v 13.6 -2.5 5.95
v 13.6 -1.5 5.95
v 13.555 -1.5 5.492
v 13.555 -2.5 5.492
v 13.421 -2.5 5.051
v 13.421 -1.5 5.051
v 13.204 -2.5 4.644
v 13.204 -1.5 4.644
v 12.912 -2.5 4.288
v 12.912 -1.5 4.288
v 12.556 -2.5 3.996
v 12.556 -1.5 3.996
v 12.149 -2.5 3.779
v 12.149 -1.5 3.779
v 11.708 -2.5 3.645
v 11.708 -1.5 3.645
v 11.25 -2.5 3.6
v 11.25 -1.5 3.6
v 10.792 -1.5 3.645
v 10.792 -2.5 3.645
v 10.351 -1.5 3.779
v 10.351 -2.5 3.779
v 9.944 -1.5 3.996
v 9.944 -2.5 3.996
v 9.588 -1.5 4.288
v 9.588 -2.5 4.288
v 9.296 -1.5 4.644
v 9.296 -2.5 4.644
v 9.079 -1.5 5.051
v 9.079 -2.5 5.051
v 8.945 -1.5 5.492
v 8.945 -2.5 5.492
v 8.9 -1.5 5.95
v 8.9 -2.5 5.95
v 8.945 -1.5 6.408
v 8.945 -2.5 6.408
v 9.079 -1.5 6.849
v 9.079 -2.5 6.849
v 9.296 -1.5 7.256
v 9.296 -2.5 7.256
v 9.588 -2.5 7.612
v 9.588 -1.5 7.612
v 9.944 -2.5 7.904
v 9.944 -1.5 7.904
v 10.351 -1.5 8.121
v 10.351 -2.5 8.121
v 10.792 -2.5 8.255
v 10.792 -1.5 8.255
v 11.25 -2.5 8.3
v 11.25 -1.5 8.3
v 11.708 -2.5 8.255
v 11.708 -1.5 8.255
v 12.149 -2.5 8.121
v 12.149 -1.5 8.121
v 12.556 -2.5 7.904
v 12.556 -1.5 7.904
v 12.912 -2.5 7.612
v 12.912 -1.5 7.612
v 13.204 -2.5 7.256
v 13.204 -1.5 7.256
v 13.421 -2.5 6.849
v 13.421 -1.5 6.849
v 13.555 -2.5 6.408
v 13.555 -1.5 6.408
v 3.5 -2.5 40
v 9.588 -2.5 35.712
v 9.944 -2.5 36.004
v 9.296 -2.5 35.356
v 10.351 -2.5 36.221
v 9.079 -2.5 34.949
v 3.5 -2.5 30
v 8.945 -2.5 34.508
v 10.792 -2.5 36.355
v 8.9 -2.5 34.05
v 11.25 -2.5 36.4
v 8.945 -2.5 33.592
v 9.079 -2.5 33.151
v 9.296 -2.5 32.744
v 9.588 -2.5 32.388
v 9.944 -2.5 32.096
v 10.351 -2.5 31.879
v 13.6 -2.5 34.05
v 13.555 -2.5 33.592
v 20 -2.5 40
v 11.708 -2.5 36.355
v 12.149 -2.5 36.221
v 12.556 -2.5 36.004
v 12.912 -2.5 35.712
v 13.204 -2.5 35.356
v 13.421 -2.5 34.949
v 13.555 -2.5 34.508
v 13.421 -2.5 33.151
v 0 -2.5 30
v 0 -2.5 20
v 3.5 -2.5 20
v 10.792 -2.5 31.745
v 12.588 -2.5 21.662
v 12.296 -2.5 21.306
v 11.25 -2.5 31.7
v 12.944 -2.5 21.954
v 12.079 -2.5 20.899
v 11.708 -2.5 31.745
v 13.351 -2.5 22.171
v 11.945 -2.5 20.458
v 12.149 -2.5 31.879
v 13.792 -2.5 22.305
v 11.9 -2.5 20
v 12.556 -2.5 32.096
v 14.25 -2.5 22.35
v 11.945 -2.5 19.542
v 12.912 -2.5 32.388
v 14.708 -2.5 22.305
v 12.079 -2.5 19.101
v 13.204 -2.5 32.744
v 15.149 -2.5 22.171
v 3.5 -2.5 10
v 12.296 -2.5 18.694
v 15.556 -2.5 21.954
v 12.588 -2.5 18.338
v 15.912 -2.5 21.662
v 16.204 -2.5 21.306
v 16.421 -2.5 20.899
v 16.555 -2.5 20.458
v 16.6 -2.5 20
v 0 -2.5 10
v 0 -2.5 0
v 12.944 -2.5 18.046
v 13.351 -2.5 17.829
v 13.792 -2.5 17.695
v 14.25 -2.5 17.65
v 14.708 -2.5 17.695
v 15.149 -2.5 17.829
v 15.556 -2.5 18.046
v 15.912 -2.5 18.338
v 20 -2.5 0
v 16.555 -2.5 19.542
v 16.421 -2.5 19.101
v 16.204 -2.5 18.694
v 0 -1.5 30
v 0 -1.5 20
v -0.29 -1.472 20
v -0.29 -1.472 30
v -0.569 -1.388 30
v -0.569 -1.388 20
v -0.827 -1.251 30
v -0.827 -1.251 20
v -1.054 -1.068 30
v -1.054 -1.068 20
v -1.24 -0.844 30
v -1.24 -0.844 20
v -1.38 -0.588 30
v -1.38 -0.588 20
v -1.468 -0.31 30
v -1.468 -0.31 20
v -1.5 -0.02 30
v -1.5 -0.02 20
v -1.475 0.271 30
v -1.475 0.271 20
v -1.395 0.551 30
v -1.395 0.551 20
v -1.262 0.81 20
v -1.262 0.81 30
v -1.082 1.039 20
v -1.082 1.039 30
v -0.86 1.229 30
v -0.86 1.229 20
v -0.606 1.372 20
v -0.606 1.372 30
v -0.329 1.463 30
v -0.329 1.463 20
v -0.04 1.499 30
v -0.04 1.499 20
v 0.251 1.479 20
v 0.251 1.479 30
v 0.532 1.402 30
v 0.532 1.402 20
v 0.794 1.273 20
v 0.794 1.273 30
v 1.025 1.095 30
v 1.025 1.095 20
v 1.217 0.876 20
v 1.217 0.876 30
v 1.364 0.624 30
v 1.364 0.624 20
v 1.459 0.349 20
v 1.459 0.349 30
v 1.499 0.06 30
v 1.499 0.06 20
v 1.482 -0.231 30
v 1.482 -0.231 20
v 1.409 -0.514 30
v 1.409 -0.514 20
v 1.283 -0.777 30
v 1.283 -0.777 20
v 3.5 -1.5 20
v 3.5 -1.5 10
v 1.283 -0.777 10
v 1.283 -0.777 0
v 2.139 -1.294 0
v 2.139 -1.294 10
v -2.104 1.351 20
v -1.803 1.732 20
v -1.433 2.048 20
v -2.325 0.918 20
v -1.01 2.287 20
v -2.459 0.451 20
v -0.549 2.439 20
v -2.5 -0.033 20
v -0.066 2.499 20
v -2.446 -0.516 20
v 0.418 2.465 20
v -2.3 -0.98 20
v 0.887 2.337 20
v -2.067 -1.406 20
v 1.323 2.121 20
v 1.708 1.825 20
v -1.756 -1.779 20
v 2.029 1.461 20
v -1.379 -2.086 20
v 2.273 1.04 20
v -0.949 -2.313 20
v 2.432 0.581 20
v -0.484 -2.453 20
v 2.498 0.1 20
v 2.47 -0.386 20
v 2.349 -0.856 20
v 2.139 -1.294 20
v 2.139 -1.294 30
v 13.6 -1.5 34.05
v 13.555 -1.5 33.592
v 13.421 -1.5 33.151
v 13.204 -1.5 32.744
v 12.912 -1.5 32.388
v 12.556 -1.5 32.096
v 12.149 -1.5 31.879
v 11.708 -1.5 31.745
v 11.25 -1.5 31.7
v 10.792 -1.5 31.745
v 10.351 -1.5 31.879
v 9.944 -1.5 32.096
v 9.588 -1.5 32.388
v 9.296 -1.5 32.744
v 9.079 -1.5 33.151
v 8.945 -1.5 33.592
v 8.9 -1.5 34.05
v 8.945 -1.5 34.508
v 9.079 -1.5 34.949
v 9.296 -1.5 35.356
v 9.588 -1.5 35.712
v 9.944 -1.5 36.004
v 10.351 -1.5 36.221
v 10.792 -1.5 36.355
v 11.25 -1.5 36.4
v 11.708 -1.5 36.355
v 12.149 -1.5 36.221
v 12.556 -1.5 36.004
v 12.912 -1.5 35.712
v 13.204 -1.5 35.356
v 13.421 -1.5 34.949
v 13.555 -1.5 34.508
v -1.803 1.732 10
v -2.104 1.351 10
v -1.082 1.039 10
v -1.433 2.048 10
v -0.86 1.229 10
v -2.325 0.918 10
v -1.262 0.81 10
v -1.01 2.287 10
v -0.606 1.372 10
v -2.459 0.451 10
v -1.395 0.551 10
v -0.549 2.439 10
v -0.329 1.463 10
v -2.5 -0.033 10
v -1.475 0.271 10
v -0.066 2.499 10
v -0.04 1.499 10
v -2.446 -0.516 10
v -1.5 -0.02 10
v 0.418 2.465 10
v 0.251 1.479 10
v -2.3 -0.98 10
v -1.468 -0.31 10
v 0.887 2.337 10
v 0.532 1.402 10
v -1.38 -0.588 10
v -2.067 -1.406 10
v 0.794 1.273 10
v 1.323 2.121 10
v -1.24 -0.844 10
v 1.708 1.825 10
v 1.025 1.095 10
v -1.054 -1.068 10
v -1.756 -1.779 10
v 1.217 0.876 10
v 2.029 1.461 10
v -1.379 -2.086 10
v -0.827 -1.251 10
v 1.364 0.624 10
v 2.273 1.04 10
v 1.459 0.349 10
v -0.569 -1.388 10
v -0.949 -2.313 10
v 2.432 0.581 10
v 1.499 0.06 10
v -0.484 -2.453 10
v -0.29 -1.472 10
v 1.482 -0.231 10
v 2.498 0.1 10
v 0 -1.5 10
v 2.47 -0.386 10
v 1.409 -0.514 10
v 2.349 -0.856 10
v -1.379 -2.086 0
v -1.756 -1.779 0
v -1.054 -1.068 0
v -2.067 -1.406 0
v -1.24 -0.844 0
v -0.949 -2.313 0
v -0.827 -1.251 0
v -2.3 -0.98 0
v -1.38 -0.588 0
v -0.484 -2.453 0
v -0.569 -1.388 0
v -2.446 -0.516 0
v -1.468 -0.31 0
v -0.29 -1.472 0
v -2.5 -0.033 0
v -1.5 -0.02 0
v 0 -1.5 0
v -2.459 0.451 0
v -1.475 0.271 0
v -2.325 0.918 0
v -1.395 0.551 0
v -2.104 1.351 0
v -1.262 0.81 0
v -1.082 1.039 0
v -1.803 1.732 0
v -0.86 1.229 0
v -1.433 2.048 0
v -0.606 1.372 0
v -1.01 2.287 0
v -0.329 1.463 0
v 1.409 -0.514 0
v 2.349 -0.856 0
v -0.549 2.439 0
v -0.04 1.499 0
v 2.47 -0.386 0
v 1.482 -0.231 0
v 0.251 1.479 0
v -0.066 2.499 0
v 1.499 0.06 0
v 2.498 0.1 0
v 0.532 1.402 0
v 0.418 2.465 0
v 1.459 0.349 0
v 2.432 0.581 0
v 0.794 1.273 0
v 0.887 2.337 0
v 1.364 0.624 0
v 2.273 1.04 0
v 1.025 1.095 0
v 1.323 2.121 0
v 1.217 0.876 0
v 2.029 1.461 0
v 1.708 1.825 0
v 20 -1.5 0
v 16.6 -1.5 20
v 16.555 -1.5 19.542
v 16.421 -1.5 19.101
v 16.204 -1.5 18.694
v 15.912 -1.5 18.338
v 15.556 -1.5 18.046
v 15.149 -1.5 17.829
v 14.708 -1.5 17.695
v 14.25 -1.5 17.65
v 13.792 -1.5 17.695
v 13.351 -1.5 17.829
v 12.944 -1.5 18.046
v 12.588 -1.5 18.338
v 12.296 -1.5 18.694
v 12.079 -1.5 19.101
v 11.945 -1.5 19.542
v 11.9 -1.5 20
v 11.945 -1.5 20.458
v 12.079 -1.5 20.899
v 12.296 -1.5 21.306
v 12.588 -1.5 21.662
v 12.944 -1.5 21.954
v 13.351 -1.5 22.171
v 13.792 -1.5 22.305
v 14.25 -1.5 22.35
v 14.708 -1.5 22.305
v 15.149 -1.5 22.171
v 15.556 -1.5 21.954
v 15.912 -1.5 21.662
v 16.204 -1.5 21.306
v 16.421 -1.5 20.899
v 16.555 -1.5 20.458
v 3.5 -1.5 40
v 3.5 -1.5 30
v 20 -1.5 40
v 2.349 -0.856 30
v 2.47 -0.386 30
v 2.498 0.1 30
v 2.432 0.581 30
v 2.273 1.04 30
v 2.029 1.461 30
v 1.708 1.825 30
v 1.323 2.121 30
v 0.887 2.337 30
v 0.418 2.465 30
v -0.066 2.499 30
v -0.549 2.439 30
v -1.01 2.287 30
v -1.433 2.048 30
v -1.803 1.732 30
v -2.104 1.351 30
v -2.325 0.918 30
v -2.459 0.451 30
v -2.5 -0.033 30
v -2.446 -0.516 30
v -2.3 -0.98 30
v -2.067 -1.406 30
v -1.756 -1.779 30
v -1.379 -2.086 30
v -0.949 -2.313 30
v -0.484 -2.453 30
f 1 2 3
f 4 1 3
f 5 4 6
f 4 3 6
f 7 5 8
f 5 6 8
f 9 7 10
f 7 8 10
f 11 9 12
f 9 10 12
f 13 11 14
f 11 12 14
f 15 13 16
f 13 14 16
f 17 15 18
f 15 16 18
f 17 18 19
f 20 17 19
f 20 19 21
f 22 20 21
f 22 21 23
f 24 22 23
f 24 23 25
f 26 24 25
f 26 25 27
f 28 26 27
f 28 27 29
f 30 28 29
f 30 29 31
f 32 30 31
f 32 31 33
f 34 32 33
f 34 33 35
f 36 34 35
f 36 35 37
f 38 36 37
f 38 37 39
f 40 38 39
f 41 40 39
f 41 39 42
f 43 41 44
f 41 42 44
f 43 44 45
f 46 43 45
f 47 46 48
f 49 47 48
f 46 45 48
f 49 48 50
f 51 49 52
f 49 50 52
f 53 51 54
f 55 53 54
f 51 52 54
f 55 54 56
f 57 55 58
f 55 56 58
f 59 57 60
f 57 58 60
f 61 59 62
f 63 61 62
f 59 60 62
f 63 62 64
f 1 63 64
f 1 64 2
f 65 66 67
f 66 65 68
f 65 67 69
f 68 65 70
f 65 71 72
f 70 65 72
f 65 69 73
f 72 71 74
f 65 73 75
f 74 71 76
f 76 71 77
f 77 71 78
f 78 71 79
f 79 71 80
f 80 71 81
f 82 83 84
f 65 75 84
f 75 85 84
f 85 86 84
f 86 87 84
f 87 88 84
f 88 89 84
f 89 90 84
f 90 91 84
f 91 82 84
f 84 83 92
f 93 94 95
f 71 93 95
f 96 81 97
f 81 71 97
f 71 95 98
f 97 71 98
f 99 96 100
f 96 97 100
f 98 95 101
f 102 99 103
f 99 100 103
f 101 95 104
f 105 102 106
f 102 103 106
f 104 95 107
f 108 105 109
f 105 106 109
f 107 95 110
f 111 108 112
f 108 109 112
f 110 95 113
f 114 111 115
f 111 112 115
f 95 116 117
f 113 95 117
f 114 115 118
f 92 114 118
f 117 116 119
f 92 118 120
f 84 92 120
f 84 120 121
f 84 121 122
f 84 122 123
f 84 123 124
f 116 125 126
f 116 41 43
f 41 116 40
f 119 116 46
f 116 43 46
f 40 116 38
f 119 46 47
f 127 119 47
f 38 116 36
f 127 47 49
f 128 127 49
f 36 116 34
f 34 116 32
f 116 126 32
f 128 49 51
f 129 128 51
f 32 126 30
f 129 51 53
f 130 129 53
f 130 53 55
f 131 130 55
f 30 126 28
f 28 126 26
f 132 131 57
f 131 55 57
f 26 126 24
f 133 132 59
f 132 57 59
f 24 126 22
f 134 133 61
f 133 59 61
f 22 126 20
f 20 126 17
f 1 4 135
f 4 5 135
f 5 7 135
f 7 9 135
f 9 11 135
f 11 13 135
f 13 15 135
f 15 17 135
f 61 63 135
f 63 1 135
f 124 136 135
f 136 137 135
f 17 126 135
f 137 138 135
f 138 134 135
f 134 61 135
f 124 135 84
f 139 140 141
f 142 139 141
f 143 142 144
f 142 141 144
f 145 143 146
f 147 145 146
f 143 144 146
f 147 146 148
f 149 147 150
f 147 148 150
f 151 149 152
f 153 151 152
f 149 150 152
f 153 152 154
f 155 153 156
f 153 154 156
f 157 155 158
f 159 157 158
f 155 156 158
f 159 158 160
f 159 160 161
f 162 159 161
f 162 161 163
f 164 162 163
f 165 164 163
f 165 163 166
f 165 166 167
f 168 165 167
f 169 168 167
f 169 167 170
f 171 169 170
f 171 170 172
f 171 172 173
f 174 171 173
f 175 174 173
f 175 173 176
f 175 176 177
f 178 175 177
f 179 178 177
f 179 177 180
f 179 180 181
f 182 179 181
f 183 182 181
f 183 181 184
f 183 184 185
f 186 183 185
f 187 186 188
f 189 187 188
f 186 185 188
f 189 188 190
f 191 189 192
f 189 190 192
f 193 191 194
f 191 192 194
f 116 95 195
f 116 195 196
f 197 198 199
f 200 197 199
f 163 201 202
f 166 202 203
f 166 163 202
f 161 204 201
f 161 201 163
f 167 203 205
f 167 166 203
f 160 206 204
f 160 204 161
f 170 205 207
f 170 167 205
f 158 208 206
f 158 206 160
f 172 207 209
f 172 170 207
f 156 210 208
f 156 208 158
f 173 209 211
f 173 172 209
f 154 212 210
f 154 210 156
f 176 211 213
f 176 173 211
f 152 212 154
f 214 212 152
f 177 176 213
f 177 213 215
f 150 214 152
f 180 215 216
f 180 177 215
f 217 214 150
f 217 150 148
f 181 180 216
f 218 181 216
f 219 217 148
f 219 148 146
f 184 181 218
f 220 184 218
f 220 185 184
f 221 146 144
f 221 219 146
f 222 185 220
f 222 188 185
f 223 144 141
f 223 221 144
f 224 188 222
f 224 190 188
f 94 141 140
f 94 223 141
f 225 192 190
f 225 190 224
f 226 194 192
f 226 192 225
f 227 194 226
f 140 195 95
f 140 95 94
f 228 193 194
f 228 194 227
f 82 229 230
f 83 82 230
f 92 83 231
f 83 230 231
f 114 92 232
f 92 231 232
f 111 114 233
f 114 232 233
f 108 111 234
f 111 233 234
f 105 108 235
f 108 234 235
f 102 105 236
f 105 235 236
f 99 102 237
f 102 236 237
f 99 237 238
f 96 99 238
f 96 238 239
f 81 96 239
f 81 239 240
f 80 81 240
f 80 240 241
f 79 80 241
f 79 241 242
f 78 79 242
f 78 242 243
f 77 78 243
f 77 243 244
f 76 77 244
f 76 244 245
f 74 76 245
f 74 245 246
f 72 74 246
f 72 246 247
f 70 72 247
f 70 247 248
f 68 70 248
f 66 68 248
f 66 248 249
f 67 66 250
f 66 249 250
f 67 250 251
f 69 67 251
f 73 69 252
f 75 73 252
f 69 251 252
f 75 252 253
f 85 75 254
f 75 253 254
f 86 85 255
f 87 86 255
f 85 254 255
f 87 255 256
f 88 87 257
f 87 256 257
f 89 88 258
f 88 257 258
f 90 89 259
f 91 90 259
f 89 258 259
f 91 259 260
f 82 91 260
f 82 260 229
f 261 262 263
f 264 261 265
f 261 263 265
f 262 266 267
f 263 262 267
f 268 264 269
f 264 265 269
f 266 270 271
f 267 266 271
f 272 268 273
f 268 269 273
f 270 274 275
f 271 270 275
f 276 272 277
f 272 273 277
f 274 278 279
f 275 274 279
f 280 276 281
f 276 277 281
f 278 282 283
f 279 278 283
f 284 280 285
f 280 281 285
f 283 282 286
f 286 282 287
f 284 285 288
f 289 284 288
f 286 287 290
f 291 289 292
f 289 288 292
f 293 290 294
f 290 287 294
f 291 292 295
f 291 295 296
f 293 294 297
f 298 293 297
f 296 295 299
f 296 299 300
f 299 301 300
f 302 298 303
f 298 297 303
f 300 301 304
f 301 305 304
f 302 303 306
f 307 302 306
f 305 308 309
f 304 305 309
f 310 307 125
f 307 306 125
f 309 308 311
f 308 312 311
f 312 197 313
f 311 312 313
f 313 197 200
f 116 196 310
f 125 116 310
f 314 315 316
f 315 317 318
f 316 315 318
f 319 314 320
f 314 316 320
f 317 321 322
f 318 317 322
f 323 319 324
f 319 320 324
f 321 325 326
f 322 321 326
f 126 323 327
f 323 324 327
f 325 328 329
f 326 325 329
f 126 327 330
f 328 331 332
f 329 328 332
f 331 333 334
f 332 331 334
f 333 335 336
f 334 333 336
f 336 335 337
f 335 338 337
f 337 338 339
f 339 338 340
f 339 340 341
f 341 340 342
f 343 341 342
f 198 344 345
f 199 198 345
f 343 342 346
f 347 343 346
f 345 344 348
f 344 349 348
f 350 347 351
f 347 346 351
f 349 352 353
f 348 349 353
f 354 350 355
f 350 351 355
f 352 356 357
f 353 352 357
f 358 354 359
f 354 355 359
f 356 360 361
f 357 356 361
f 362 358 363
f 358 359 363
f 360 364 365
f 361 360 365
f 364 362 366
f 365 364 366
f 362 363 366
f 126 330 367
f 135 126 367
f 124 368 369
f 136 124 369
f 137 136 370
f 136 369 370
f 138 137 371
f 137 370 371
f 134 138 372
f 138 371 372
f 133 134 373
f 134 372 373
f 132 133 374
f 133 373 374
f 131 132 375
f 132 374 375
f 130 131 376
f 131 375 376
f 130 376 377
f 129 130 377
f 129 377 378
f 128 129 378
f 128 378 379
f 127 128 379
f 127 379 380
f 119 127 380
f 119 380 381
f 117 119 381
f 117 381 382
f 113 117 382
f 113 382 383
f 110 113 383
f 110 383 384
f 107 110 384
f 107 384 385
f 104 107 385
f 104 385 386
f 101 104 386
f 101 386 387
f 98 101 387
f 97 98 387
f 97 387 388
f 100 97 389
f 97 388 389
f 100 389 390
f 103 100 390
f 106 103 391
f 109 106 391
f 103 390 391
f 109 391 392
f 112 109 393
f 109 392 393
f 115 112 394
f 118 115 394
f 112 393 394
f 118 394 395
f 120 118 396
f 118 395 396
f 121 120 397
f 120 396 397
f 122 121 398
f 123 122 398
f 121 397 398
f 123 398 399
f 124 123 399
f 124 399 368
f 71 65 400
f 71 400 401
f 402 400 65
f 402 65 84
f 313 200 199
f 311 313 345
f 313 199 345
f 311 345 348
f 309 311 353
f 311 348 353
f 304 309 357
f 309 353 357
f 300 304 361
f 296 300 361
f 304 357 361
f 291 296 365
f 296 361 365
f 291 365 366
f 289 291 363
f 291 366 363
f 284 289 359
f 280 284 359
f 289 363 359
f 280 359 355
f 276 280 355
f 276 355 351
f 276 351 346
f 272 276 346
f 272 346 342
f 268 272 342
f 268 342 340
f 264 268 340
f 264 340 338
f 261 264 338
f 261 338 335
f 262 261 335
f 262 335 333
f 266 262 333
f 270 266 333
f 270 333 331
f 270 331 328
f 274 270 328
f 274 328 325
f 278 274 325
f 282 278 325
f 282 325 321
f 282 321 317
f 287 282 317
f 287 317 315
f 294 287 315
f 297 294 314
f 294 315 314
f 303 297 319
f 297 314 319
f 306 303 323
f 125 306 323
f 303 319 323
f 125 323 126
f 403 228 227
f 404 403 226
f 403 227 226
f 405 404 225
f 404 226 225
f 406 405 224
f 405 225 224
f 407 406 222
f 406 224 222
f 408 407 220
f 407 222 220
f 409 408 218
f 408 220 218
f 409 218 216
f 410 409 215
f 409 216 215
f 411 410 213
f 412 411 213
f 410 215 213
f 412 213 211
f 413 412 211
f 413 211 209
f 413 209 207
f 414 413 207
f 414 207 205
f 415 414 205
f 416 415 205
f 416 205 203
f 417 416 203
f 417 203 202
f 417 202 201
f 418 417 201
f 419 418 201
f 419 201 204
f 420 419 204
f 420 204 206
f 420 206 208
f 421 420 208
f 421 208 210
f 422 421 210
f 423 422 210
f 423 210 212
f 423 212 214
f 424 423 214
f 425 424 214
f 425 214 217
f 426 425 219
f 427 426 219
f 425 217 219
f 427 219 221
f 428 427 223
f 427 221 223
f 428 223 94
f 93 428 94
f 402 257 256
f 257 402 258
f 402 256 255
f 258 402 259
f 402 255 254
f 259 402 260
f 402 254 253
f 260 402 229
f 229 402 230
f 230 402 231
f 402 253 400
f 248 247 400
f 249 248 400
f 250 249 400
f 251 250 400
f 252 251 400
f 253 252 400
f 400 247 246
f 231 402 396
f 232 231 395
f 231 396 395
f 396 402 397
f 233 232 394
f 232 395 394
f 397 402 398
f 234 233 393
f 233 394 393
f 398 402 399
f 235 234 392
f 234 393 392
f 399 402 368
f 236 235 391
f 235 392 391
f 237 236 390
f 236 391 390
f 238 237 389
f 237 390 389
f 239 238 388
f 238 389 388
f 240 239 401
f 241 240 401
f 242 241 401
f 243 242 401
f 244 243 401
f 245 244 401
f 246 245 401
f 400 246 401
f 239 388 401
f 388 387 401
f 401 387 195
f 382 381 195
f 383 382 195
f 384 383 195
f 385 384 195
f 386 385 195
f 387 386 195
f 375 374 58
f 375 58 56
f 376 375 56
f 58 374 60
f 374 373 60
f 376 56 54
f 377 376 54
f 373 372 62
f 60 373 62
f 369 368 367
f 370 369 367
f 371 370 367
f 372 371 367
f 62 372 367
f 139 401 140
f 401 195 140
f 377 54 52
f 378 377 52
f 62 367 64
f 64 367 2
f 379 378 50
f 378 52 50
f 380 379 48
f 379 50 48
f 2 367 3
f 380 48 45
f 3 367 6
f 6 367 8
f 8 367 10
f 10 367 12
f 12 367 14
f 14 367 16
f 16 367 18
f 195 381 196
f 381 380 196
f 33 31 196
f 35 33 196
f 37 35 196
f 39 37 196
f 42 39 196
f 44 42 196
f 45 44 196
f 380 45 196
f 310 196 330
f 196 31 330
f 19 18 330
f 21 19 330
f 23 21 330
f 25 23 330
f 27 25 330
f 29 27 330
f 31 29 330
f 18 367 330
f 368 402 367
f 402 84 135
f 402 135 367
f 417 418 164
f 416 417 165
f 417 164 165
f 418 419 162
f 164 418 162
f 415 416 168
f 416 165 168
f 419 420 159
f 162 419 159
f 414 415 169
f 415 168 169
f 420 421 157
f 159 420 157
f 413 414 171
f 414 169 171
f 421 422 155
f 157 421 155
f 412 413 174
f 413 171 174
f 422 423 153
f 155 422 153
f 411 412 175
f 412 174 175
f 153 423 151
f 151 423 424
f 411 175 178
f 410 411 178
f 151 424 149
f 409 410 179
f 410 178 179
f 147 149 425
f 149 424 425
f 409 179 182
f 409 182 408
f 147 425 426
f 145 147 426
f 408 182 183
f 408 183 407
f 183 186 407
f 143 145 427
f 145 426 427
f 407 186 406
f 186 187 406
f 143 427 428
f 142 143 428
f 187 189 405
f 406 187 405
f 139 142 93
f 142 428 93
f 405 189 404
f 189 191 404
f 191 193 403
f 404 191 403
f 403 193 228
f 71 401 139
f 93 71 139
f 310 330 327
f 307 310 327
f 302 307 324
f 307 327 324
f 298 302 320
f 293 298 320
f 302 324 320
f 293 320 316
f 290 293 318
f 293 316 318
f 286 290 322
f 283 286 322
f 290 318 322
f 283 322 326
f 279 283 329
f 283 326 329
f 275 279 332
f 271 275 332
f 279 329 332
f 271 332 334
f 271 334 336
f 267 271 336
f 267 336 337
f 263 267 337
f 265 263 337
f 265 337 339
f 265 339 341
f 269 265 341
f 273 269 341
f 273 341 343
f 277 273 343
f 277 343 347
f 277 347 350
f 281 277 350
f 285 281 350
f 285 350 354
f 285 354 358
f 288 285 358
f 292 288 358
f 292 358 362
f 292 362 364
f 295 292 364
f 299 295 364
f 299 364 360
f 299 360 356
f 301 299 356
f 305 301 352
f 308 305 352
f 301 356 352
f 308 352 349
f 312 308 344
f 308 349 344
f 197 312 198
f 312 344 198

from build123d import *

# Parameters (mm, degrees)
EXTRUDE_THIN2_DEPTH     = 40
CUT_EXTRUDE1_DEPTH      = 45.791182168
CUT_EXTRUDE1_DEPTH_BACK = 45.791182168
SKETCH2_W               = 6
SKETCH2_H               = 10
SKETCH3_R               = 2.35
CUT_EXTRUDE2_DEPTH      = 10


with BuildPart() as part:
    # Sketch1 → Extrude-Thin2 (new body)
    with BuildSketch(Plane.XY):
        with BuildLine():
            Line((20, -1.5), (0, -1.5))
            ThreePointArc((0, -1.5), (-0.736574842, 1.306697173), (1.283307019, -0.776610002))
            Line((1.283307019, -0.776610002), (2.138845031, -1.294350004))
            ThreePointArc((2.138845031, -1.294350004), (-1.227624737, 2.177828622), (0, -2.5))
            Line((0, -2.5), (20, -2.5))
            Line((20, -2.5), (20, -1.5))
        make_face()
    extrude(amount=EXTRUDE_THIN2_DEPTH)

    # Sketch2 → Cut-Extrude1 (cut, two sides: drawn at the far end of the back side and taken through both)
    with BuildSketch(Plane(origin=(0, 0, 0), x_dir=(1, 0, 0), z_dir=(0, 1, 0)).offset(-CUT_EXTRUDE1_DEPTH_BACK)):
        with Locations((0.5, -15)):
            Rectangle(SKETCH2_W, SKETCH2_H)
        with Locations((0.5, -35)):
            Rectangle(SKETCH2_W, SKETCH2_H)
    extrude(amount=CUT_EXTRUDE1_DEPTH + CUT_EXTRUDE1_DEPTH_BACK, mode=Mode.SUBTRACT)

    # Sketch3 → Cut-Extrude2 (cut)
    with BuildSketch(Plane(origin=(0, 0, 0), x_dir=(1, 0, 0), z_dir=(0, 1, 0))):
        with Locations((14.25, -20)):
            Circle(SKETCH3_R)
        with Locations((11.25, -34.05)):
            Circle(SKETCH3_R)
        with Locations((11.25, -5.95)):
            Circle(SKETCH3_R)
    extrude(amount=-CUT_EXTRUDE2_DEPTH, mode=Mode.SUBTRACT)


solid = part.part
